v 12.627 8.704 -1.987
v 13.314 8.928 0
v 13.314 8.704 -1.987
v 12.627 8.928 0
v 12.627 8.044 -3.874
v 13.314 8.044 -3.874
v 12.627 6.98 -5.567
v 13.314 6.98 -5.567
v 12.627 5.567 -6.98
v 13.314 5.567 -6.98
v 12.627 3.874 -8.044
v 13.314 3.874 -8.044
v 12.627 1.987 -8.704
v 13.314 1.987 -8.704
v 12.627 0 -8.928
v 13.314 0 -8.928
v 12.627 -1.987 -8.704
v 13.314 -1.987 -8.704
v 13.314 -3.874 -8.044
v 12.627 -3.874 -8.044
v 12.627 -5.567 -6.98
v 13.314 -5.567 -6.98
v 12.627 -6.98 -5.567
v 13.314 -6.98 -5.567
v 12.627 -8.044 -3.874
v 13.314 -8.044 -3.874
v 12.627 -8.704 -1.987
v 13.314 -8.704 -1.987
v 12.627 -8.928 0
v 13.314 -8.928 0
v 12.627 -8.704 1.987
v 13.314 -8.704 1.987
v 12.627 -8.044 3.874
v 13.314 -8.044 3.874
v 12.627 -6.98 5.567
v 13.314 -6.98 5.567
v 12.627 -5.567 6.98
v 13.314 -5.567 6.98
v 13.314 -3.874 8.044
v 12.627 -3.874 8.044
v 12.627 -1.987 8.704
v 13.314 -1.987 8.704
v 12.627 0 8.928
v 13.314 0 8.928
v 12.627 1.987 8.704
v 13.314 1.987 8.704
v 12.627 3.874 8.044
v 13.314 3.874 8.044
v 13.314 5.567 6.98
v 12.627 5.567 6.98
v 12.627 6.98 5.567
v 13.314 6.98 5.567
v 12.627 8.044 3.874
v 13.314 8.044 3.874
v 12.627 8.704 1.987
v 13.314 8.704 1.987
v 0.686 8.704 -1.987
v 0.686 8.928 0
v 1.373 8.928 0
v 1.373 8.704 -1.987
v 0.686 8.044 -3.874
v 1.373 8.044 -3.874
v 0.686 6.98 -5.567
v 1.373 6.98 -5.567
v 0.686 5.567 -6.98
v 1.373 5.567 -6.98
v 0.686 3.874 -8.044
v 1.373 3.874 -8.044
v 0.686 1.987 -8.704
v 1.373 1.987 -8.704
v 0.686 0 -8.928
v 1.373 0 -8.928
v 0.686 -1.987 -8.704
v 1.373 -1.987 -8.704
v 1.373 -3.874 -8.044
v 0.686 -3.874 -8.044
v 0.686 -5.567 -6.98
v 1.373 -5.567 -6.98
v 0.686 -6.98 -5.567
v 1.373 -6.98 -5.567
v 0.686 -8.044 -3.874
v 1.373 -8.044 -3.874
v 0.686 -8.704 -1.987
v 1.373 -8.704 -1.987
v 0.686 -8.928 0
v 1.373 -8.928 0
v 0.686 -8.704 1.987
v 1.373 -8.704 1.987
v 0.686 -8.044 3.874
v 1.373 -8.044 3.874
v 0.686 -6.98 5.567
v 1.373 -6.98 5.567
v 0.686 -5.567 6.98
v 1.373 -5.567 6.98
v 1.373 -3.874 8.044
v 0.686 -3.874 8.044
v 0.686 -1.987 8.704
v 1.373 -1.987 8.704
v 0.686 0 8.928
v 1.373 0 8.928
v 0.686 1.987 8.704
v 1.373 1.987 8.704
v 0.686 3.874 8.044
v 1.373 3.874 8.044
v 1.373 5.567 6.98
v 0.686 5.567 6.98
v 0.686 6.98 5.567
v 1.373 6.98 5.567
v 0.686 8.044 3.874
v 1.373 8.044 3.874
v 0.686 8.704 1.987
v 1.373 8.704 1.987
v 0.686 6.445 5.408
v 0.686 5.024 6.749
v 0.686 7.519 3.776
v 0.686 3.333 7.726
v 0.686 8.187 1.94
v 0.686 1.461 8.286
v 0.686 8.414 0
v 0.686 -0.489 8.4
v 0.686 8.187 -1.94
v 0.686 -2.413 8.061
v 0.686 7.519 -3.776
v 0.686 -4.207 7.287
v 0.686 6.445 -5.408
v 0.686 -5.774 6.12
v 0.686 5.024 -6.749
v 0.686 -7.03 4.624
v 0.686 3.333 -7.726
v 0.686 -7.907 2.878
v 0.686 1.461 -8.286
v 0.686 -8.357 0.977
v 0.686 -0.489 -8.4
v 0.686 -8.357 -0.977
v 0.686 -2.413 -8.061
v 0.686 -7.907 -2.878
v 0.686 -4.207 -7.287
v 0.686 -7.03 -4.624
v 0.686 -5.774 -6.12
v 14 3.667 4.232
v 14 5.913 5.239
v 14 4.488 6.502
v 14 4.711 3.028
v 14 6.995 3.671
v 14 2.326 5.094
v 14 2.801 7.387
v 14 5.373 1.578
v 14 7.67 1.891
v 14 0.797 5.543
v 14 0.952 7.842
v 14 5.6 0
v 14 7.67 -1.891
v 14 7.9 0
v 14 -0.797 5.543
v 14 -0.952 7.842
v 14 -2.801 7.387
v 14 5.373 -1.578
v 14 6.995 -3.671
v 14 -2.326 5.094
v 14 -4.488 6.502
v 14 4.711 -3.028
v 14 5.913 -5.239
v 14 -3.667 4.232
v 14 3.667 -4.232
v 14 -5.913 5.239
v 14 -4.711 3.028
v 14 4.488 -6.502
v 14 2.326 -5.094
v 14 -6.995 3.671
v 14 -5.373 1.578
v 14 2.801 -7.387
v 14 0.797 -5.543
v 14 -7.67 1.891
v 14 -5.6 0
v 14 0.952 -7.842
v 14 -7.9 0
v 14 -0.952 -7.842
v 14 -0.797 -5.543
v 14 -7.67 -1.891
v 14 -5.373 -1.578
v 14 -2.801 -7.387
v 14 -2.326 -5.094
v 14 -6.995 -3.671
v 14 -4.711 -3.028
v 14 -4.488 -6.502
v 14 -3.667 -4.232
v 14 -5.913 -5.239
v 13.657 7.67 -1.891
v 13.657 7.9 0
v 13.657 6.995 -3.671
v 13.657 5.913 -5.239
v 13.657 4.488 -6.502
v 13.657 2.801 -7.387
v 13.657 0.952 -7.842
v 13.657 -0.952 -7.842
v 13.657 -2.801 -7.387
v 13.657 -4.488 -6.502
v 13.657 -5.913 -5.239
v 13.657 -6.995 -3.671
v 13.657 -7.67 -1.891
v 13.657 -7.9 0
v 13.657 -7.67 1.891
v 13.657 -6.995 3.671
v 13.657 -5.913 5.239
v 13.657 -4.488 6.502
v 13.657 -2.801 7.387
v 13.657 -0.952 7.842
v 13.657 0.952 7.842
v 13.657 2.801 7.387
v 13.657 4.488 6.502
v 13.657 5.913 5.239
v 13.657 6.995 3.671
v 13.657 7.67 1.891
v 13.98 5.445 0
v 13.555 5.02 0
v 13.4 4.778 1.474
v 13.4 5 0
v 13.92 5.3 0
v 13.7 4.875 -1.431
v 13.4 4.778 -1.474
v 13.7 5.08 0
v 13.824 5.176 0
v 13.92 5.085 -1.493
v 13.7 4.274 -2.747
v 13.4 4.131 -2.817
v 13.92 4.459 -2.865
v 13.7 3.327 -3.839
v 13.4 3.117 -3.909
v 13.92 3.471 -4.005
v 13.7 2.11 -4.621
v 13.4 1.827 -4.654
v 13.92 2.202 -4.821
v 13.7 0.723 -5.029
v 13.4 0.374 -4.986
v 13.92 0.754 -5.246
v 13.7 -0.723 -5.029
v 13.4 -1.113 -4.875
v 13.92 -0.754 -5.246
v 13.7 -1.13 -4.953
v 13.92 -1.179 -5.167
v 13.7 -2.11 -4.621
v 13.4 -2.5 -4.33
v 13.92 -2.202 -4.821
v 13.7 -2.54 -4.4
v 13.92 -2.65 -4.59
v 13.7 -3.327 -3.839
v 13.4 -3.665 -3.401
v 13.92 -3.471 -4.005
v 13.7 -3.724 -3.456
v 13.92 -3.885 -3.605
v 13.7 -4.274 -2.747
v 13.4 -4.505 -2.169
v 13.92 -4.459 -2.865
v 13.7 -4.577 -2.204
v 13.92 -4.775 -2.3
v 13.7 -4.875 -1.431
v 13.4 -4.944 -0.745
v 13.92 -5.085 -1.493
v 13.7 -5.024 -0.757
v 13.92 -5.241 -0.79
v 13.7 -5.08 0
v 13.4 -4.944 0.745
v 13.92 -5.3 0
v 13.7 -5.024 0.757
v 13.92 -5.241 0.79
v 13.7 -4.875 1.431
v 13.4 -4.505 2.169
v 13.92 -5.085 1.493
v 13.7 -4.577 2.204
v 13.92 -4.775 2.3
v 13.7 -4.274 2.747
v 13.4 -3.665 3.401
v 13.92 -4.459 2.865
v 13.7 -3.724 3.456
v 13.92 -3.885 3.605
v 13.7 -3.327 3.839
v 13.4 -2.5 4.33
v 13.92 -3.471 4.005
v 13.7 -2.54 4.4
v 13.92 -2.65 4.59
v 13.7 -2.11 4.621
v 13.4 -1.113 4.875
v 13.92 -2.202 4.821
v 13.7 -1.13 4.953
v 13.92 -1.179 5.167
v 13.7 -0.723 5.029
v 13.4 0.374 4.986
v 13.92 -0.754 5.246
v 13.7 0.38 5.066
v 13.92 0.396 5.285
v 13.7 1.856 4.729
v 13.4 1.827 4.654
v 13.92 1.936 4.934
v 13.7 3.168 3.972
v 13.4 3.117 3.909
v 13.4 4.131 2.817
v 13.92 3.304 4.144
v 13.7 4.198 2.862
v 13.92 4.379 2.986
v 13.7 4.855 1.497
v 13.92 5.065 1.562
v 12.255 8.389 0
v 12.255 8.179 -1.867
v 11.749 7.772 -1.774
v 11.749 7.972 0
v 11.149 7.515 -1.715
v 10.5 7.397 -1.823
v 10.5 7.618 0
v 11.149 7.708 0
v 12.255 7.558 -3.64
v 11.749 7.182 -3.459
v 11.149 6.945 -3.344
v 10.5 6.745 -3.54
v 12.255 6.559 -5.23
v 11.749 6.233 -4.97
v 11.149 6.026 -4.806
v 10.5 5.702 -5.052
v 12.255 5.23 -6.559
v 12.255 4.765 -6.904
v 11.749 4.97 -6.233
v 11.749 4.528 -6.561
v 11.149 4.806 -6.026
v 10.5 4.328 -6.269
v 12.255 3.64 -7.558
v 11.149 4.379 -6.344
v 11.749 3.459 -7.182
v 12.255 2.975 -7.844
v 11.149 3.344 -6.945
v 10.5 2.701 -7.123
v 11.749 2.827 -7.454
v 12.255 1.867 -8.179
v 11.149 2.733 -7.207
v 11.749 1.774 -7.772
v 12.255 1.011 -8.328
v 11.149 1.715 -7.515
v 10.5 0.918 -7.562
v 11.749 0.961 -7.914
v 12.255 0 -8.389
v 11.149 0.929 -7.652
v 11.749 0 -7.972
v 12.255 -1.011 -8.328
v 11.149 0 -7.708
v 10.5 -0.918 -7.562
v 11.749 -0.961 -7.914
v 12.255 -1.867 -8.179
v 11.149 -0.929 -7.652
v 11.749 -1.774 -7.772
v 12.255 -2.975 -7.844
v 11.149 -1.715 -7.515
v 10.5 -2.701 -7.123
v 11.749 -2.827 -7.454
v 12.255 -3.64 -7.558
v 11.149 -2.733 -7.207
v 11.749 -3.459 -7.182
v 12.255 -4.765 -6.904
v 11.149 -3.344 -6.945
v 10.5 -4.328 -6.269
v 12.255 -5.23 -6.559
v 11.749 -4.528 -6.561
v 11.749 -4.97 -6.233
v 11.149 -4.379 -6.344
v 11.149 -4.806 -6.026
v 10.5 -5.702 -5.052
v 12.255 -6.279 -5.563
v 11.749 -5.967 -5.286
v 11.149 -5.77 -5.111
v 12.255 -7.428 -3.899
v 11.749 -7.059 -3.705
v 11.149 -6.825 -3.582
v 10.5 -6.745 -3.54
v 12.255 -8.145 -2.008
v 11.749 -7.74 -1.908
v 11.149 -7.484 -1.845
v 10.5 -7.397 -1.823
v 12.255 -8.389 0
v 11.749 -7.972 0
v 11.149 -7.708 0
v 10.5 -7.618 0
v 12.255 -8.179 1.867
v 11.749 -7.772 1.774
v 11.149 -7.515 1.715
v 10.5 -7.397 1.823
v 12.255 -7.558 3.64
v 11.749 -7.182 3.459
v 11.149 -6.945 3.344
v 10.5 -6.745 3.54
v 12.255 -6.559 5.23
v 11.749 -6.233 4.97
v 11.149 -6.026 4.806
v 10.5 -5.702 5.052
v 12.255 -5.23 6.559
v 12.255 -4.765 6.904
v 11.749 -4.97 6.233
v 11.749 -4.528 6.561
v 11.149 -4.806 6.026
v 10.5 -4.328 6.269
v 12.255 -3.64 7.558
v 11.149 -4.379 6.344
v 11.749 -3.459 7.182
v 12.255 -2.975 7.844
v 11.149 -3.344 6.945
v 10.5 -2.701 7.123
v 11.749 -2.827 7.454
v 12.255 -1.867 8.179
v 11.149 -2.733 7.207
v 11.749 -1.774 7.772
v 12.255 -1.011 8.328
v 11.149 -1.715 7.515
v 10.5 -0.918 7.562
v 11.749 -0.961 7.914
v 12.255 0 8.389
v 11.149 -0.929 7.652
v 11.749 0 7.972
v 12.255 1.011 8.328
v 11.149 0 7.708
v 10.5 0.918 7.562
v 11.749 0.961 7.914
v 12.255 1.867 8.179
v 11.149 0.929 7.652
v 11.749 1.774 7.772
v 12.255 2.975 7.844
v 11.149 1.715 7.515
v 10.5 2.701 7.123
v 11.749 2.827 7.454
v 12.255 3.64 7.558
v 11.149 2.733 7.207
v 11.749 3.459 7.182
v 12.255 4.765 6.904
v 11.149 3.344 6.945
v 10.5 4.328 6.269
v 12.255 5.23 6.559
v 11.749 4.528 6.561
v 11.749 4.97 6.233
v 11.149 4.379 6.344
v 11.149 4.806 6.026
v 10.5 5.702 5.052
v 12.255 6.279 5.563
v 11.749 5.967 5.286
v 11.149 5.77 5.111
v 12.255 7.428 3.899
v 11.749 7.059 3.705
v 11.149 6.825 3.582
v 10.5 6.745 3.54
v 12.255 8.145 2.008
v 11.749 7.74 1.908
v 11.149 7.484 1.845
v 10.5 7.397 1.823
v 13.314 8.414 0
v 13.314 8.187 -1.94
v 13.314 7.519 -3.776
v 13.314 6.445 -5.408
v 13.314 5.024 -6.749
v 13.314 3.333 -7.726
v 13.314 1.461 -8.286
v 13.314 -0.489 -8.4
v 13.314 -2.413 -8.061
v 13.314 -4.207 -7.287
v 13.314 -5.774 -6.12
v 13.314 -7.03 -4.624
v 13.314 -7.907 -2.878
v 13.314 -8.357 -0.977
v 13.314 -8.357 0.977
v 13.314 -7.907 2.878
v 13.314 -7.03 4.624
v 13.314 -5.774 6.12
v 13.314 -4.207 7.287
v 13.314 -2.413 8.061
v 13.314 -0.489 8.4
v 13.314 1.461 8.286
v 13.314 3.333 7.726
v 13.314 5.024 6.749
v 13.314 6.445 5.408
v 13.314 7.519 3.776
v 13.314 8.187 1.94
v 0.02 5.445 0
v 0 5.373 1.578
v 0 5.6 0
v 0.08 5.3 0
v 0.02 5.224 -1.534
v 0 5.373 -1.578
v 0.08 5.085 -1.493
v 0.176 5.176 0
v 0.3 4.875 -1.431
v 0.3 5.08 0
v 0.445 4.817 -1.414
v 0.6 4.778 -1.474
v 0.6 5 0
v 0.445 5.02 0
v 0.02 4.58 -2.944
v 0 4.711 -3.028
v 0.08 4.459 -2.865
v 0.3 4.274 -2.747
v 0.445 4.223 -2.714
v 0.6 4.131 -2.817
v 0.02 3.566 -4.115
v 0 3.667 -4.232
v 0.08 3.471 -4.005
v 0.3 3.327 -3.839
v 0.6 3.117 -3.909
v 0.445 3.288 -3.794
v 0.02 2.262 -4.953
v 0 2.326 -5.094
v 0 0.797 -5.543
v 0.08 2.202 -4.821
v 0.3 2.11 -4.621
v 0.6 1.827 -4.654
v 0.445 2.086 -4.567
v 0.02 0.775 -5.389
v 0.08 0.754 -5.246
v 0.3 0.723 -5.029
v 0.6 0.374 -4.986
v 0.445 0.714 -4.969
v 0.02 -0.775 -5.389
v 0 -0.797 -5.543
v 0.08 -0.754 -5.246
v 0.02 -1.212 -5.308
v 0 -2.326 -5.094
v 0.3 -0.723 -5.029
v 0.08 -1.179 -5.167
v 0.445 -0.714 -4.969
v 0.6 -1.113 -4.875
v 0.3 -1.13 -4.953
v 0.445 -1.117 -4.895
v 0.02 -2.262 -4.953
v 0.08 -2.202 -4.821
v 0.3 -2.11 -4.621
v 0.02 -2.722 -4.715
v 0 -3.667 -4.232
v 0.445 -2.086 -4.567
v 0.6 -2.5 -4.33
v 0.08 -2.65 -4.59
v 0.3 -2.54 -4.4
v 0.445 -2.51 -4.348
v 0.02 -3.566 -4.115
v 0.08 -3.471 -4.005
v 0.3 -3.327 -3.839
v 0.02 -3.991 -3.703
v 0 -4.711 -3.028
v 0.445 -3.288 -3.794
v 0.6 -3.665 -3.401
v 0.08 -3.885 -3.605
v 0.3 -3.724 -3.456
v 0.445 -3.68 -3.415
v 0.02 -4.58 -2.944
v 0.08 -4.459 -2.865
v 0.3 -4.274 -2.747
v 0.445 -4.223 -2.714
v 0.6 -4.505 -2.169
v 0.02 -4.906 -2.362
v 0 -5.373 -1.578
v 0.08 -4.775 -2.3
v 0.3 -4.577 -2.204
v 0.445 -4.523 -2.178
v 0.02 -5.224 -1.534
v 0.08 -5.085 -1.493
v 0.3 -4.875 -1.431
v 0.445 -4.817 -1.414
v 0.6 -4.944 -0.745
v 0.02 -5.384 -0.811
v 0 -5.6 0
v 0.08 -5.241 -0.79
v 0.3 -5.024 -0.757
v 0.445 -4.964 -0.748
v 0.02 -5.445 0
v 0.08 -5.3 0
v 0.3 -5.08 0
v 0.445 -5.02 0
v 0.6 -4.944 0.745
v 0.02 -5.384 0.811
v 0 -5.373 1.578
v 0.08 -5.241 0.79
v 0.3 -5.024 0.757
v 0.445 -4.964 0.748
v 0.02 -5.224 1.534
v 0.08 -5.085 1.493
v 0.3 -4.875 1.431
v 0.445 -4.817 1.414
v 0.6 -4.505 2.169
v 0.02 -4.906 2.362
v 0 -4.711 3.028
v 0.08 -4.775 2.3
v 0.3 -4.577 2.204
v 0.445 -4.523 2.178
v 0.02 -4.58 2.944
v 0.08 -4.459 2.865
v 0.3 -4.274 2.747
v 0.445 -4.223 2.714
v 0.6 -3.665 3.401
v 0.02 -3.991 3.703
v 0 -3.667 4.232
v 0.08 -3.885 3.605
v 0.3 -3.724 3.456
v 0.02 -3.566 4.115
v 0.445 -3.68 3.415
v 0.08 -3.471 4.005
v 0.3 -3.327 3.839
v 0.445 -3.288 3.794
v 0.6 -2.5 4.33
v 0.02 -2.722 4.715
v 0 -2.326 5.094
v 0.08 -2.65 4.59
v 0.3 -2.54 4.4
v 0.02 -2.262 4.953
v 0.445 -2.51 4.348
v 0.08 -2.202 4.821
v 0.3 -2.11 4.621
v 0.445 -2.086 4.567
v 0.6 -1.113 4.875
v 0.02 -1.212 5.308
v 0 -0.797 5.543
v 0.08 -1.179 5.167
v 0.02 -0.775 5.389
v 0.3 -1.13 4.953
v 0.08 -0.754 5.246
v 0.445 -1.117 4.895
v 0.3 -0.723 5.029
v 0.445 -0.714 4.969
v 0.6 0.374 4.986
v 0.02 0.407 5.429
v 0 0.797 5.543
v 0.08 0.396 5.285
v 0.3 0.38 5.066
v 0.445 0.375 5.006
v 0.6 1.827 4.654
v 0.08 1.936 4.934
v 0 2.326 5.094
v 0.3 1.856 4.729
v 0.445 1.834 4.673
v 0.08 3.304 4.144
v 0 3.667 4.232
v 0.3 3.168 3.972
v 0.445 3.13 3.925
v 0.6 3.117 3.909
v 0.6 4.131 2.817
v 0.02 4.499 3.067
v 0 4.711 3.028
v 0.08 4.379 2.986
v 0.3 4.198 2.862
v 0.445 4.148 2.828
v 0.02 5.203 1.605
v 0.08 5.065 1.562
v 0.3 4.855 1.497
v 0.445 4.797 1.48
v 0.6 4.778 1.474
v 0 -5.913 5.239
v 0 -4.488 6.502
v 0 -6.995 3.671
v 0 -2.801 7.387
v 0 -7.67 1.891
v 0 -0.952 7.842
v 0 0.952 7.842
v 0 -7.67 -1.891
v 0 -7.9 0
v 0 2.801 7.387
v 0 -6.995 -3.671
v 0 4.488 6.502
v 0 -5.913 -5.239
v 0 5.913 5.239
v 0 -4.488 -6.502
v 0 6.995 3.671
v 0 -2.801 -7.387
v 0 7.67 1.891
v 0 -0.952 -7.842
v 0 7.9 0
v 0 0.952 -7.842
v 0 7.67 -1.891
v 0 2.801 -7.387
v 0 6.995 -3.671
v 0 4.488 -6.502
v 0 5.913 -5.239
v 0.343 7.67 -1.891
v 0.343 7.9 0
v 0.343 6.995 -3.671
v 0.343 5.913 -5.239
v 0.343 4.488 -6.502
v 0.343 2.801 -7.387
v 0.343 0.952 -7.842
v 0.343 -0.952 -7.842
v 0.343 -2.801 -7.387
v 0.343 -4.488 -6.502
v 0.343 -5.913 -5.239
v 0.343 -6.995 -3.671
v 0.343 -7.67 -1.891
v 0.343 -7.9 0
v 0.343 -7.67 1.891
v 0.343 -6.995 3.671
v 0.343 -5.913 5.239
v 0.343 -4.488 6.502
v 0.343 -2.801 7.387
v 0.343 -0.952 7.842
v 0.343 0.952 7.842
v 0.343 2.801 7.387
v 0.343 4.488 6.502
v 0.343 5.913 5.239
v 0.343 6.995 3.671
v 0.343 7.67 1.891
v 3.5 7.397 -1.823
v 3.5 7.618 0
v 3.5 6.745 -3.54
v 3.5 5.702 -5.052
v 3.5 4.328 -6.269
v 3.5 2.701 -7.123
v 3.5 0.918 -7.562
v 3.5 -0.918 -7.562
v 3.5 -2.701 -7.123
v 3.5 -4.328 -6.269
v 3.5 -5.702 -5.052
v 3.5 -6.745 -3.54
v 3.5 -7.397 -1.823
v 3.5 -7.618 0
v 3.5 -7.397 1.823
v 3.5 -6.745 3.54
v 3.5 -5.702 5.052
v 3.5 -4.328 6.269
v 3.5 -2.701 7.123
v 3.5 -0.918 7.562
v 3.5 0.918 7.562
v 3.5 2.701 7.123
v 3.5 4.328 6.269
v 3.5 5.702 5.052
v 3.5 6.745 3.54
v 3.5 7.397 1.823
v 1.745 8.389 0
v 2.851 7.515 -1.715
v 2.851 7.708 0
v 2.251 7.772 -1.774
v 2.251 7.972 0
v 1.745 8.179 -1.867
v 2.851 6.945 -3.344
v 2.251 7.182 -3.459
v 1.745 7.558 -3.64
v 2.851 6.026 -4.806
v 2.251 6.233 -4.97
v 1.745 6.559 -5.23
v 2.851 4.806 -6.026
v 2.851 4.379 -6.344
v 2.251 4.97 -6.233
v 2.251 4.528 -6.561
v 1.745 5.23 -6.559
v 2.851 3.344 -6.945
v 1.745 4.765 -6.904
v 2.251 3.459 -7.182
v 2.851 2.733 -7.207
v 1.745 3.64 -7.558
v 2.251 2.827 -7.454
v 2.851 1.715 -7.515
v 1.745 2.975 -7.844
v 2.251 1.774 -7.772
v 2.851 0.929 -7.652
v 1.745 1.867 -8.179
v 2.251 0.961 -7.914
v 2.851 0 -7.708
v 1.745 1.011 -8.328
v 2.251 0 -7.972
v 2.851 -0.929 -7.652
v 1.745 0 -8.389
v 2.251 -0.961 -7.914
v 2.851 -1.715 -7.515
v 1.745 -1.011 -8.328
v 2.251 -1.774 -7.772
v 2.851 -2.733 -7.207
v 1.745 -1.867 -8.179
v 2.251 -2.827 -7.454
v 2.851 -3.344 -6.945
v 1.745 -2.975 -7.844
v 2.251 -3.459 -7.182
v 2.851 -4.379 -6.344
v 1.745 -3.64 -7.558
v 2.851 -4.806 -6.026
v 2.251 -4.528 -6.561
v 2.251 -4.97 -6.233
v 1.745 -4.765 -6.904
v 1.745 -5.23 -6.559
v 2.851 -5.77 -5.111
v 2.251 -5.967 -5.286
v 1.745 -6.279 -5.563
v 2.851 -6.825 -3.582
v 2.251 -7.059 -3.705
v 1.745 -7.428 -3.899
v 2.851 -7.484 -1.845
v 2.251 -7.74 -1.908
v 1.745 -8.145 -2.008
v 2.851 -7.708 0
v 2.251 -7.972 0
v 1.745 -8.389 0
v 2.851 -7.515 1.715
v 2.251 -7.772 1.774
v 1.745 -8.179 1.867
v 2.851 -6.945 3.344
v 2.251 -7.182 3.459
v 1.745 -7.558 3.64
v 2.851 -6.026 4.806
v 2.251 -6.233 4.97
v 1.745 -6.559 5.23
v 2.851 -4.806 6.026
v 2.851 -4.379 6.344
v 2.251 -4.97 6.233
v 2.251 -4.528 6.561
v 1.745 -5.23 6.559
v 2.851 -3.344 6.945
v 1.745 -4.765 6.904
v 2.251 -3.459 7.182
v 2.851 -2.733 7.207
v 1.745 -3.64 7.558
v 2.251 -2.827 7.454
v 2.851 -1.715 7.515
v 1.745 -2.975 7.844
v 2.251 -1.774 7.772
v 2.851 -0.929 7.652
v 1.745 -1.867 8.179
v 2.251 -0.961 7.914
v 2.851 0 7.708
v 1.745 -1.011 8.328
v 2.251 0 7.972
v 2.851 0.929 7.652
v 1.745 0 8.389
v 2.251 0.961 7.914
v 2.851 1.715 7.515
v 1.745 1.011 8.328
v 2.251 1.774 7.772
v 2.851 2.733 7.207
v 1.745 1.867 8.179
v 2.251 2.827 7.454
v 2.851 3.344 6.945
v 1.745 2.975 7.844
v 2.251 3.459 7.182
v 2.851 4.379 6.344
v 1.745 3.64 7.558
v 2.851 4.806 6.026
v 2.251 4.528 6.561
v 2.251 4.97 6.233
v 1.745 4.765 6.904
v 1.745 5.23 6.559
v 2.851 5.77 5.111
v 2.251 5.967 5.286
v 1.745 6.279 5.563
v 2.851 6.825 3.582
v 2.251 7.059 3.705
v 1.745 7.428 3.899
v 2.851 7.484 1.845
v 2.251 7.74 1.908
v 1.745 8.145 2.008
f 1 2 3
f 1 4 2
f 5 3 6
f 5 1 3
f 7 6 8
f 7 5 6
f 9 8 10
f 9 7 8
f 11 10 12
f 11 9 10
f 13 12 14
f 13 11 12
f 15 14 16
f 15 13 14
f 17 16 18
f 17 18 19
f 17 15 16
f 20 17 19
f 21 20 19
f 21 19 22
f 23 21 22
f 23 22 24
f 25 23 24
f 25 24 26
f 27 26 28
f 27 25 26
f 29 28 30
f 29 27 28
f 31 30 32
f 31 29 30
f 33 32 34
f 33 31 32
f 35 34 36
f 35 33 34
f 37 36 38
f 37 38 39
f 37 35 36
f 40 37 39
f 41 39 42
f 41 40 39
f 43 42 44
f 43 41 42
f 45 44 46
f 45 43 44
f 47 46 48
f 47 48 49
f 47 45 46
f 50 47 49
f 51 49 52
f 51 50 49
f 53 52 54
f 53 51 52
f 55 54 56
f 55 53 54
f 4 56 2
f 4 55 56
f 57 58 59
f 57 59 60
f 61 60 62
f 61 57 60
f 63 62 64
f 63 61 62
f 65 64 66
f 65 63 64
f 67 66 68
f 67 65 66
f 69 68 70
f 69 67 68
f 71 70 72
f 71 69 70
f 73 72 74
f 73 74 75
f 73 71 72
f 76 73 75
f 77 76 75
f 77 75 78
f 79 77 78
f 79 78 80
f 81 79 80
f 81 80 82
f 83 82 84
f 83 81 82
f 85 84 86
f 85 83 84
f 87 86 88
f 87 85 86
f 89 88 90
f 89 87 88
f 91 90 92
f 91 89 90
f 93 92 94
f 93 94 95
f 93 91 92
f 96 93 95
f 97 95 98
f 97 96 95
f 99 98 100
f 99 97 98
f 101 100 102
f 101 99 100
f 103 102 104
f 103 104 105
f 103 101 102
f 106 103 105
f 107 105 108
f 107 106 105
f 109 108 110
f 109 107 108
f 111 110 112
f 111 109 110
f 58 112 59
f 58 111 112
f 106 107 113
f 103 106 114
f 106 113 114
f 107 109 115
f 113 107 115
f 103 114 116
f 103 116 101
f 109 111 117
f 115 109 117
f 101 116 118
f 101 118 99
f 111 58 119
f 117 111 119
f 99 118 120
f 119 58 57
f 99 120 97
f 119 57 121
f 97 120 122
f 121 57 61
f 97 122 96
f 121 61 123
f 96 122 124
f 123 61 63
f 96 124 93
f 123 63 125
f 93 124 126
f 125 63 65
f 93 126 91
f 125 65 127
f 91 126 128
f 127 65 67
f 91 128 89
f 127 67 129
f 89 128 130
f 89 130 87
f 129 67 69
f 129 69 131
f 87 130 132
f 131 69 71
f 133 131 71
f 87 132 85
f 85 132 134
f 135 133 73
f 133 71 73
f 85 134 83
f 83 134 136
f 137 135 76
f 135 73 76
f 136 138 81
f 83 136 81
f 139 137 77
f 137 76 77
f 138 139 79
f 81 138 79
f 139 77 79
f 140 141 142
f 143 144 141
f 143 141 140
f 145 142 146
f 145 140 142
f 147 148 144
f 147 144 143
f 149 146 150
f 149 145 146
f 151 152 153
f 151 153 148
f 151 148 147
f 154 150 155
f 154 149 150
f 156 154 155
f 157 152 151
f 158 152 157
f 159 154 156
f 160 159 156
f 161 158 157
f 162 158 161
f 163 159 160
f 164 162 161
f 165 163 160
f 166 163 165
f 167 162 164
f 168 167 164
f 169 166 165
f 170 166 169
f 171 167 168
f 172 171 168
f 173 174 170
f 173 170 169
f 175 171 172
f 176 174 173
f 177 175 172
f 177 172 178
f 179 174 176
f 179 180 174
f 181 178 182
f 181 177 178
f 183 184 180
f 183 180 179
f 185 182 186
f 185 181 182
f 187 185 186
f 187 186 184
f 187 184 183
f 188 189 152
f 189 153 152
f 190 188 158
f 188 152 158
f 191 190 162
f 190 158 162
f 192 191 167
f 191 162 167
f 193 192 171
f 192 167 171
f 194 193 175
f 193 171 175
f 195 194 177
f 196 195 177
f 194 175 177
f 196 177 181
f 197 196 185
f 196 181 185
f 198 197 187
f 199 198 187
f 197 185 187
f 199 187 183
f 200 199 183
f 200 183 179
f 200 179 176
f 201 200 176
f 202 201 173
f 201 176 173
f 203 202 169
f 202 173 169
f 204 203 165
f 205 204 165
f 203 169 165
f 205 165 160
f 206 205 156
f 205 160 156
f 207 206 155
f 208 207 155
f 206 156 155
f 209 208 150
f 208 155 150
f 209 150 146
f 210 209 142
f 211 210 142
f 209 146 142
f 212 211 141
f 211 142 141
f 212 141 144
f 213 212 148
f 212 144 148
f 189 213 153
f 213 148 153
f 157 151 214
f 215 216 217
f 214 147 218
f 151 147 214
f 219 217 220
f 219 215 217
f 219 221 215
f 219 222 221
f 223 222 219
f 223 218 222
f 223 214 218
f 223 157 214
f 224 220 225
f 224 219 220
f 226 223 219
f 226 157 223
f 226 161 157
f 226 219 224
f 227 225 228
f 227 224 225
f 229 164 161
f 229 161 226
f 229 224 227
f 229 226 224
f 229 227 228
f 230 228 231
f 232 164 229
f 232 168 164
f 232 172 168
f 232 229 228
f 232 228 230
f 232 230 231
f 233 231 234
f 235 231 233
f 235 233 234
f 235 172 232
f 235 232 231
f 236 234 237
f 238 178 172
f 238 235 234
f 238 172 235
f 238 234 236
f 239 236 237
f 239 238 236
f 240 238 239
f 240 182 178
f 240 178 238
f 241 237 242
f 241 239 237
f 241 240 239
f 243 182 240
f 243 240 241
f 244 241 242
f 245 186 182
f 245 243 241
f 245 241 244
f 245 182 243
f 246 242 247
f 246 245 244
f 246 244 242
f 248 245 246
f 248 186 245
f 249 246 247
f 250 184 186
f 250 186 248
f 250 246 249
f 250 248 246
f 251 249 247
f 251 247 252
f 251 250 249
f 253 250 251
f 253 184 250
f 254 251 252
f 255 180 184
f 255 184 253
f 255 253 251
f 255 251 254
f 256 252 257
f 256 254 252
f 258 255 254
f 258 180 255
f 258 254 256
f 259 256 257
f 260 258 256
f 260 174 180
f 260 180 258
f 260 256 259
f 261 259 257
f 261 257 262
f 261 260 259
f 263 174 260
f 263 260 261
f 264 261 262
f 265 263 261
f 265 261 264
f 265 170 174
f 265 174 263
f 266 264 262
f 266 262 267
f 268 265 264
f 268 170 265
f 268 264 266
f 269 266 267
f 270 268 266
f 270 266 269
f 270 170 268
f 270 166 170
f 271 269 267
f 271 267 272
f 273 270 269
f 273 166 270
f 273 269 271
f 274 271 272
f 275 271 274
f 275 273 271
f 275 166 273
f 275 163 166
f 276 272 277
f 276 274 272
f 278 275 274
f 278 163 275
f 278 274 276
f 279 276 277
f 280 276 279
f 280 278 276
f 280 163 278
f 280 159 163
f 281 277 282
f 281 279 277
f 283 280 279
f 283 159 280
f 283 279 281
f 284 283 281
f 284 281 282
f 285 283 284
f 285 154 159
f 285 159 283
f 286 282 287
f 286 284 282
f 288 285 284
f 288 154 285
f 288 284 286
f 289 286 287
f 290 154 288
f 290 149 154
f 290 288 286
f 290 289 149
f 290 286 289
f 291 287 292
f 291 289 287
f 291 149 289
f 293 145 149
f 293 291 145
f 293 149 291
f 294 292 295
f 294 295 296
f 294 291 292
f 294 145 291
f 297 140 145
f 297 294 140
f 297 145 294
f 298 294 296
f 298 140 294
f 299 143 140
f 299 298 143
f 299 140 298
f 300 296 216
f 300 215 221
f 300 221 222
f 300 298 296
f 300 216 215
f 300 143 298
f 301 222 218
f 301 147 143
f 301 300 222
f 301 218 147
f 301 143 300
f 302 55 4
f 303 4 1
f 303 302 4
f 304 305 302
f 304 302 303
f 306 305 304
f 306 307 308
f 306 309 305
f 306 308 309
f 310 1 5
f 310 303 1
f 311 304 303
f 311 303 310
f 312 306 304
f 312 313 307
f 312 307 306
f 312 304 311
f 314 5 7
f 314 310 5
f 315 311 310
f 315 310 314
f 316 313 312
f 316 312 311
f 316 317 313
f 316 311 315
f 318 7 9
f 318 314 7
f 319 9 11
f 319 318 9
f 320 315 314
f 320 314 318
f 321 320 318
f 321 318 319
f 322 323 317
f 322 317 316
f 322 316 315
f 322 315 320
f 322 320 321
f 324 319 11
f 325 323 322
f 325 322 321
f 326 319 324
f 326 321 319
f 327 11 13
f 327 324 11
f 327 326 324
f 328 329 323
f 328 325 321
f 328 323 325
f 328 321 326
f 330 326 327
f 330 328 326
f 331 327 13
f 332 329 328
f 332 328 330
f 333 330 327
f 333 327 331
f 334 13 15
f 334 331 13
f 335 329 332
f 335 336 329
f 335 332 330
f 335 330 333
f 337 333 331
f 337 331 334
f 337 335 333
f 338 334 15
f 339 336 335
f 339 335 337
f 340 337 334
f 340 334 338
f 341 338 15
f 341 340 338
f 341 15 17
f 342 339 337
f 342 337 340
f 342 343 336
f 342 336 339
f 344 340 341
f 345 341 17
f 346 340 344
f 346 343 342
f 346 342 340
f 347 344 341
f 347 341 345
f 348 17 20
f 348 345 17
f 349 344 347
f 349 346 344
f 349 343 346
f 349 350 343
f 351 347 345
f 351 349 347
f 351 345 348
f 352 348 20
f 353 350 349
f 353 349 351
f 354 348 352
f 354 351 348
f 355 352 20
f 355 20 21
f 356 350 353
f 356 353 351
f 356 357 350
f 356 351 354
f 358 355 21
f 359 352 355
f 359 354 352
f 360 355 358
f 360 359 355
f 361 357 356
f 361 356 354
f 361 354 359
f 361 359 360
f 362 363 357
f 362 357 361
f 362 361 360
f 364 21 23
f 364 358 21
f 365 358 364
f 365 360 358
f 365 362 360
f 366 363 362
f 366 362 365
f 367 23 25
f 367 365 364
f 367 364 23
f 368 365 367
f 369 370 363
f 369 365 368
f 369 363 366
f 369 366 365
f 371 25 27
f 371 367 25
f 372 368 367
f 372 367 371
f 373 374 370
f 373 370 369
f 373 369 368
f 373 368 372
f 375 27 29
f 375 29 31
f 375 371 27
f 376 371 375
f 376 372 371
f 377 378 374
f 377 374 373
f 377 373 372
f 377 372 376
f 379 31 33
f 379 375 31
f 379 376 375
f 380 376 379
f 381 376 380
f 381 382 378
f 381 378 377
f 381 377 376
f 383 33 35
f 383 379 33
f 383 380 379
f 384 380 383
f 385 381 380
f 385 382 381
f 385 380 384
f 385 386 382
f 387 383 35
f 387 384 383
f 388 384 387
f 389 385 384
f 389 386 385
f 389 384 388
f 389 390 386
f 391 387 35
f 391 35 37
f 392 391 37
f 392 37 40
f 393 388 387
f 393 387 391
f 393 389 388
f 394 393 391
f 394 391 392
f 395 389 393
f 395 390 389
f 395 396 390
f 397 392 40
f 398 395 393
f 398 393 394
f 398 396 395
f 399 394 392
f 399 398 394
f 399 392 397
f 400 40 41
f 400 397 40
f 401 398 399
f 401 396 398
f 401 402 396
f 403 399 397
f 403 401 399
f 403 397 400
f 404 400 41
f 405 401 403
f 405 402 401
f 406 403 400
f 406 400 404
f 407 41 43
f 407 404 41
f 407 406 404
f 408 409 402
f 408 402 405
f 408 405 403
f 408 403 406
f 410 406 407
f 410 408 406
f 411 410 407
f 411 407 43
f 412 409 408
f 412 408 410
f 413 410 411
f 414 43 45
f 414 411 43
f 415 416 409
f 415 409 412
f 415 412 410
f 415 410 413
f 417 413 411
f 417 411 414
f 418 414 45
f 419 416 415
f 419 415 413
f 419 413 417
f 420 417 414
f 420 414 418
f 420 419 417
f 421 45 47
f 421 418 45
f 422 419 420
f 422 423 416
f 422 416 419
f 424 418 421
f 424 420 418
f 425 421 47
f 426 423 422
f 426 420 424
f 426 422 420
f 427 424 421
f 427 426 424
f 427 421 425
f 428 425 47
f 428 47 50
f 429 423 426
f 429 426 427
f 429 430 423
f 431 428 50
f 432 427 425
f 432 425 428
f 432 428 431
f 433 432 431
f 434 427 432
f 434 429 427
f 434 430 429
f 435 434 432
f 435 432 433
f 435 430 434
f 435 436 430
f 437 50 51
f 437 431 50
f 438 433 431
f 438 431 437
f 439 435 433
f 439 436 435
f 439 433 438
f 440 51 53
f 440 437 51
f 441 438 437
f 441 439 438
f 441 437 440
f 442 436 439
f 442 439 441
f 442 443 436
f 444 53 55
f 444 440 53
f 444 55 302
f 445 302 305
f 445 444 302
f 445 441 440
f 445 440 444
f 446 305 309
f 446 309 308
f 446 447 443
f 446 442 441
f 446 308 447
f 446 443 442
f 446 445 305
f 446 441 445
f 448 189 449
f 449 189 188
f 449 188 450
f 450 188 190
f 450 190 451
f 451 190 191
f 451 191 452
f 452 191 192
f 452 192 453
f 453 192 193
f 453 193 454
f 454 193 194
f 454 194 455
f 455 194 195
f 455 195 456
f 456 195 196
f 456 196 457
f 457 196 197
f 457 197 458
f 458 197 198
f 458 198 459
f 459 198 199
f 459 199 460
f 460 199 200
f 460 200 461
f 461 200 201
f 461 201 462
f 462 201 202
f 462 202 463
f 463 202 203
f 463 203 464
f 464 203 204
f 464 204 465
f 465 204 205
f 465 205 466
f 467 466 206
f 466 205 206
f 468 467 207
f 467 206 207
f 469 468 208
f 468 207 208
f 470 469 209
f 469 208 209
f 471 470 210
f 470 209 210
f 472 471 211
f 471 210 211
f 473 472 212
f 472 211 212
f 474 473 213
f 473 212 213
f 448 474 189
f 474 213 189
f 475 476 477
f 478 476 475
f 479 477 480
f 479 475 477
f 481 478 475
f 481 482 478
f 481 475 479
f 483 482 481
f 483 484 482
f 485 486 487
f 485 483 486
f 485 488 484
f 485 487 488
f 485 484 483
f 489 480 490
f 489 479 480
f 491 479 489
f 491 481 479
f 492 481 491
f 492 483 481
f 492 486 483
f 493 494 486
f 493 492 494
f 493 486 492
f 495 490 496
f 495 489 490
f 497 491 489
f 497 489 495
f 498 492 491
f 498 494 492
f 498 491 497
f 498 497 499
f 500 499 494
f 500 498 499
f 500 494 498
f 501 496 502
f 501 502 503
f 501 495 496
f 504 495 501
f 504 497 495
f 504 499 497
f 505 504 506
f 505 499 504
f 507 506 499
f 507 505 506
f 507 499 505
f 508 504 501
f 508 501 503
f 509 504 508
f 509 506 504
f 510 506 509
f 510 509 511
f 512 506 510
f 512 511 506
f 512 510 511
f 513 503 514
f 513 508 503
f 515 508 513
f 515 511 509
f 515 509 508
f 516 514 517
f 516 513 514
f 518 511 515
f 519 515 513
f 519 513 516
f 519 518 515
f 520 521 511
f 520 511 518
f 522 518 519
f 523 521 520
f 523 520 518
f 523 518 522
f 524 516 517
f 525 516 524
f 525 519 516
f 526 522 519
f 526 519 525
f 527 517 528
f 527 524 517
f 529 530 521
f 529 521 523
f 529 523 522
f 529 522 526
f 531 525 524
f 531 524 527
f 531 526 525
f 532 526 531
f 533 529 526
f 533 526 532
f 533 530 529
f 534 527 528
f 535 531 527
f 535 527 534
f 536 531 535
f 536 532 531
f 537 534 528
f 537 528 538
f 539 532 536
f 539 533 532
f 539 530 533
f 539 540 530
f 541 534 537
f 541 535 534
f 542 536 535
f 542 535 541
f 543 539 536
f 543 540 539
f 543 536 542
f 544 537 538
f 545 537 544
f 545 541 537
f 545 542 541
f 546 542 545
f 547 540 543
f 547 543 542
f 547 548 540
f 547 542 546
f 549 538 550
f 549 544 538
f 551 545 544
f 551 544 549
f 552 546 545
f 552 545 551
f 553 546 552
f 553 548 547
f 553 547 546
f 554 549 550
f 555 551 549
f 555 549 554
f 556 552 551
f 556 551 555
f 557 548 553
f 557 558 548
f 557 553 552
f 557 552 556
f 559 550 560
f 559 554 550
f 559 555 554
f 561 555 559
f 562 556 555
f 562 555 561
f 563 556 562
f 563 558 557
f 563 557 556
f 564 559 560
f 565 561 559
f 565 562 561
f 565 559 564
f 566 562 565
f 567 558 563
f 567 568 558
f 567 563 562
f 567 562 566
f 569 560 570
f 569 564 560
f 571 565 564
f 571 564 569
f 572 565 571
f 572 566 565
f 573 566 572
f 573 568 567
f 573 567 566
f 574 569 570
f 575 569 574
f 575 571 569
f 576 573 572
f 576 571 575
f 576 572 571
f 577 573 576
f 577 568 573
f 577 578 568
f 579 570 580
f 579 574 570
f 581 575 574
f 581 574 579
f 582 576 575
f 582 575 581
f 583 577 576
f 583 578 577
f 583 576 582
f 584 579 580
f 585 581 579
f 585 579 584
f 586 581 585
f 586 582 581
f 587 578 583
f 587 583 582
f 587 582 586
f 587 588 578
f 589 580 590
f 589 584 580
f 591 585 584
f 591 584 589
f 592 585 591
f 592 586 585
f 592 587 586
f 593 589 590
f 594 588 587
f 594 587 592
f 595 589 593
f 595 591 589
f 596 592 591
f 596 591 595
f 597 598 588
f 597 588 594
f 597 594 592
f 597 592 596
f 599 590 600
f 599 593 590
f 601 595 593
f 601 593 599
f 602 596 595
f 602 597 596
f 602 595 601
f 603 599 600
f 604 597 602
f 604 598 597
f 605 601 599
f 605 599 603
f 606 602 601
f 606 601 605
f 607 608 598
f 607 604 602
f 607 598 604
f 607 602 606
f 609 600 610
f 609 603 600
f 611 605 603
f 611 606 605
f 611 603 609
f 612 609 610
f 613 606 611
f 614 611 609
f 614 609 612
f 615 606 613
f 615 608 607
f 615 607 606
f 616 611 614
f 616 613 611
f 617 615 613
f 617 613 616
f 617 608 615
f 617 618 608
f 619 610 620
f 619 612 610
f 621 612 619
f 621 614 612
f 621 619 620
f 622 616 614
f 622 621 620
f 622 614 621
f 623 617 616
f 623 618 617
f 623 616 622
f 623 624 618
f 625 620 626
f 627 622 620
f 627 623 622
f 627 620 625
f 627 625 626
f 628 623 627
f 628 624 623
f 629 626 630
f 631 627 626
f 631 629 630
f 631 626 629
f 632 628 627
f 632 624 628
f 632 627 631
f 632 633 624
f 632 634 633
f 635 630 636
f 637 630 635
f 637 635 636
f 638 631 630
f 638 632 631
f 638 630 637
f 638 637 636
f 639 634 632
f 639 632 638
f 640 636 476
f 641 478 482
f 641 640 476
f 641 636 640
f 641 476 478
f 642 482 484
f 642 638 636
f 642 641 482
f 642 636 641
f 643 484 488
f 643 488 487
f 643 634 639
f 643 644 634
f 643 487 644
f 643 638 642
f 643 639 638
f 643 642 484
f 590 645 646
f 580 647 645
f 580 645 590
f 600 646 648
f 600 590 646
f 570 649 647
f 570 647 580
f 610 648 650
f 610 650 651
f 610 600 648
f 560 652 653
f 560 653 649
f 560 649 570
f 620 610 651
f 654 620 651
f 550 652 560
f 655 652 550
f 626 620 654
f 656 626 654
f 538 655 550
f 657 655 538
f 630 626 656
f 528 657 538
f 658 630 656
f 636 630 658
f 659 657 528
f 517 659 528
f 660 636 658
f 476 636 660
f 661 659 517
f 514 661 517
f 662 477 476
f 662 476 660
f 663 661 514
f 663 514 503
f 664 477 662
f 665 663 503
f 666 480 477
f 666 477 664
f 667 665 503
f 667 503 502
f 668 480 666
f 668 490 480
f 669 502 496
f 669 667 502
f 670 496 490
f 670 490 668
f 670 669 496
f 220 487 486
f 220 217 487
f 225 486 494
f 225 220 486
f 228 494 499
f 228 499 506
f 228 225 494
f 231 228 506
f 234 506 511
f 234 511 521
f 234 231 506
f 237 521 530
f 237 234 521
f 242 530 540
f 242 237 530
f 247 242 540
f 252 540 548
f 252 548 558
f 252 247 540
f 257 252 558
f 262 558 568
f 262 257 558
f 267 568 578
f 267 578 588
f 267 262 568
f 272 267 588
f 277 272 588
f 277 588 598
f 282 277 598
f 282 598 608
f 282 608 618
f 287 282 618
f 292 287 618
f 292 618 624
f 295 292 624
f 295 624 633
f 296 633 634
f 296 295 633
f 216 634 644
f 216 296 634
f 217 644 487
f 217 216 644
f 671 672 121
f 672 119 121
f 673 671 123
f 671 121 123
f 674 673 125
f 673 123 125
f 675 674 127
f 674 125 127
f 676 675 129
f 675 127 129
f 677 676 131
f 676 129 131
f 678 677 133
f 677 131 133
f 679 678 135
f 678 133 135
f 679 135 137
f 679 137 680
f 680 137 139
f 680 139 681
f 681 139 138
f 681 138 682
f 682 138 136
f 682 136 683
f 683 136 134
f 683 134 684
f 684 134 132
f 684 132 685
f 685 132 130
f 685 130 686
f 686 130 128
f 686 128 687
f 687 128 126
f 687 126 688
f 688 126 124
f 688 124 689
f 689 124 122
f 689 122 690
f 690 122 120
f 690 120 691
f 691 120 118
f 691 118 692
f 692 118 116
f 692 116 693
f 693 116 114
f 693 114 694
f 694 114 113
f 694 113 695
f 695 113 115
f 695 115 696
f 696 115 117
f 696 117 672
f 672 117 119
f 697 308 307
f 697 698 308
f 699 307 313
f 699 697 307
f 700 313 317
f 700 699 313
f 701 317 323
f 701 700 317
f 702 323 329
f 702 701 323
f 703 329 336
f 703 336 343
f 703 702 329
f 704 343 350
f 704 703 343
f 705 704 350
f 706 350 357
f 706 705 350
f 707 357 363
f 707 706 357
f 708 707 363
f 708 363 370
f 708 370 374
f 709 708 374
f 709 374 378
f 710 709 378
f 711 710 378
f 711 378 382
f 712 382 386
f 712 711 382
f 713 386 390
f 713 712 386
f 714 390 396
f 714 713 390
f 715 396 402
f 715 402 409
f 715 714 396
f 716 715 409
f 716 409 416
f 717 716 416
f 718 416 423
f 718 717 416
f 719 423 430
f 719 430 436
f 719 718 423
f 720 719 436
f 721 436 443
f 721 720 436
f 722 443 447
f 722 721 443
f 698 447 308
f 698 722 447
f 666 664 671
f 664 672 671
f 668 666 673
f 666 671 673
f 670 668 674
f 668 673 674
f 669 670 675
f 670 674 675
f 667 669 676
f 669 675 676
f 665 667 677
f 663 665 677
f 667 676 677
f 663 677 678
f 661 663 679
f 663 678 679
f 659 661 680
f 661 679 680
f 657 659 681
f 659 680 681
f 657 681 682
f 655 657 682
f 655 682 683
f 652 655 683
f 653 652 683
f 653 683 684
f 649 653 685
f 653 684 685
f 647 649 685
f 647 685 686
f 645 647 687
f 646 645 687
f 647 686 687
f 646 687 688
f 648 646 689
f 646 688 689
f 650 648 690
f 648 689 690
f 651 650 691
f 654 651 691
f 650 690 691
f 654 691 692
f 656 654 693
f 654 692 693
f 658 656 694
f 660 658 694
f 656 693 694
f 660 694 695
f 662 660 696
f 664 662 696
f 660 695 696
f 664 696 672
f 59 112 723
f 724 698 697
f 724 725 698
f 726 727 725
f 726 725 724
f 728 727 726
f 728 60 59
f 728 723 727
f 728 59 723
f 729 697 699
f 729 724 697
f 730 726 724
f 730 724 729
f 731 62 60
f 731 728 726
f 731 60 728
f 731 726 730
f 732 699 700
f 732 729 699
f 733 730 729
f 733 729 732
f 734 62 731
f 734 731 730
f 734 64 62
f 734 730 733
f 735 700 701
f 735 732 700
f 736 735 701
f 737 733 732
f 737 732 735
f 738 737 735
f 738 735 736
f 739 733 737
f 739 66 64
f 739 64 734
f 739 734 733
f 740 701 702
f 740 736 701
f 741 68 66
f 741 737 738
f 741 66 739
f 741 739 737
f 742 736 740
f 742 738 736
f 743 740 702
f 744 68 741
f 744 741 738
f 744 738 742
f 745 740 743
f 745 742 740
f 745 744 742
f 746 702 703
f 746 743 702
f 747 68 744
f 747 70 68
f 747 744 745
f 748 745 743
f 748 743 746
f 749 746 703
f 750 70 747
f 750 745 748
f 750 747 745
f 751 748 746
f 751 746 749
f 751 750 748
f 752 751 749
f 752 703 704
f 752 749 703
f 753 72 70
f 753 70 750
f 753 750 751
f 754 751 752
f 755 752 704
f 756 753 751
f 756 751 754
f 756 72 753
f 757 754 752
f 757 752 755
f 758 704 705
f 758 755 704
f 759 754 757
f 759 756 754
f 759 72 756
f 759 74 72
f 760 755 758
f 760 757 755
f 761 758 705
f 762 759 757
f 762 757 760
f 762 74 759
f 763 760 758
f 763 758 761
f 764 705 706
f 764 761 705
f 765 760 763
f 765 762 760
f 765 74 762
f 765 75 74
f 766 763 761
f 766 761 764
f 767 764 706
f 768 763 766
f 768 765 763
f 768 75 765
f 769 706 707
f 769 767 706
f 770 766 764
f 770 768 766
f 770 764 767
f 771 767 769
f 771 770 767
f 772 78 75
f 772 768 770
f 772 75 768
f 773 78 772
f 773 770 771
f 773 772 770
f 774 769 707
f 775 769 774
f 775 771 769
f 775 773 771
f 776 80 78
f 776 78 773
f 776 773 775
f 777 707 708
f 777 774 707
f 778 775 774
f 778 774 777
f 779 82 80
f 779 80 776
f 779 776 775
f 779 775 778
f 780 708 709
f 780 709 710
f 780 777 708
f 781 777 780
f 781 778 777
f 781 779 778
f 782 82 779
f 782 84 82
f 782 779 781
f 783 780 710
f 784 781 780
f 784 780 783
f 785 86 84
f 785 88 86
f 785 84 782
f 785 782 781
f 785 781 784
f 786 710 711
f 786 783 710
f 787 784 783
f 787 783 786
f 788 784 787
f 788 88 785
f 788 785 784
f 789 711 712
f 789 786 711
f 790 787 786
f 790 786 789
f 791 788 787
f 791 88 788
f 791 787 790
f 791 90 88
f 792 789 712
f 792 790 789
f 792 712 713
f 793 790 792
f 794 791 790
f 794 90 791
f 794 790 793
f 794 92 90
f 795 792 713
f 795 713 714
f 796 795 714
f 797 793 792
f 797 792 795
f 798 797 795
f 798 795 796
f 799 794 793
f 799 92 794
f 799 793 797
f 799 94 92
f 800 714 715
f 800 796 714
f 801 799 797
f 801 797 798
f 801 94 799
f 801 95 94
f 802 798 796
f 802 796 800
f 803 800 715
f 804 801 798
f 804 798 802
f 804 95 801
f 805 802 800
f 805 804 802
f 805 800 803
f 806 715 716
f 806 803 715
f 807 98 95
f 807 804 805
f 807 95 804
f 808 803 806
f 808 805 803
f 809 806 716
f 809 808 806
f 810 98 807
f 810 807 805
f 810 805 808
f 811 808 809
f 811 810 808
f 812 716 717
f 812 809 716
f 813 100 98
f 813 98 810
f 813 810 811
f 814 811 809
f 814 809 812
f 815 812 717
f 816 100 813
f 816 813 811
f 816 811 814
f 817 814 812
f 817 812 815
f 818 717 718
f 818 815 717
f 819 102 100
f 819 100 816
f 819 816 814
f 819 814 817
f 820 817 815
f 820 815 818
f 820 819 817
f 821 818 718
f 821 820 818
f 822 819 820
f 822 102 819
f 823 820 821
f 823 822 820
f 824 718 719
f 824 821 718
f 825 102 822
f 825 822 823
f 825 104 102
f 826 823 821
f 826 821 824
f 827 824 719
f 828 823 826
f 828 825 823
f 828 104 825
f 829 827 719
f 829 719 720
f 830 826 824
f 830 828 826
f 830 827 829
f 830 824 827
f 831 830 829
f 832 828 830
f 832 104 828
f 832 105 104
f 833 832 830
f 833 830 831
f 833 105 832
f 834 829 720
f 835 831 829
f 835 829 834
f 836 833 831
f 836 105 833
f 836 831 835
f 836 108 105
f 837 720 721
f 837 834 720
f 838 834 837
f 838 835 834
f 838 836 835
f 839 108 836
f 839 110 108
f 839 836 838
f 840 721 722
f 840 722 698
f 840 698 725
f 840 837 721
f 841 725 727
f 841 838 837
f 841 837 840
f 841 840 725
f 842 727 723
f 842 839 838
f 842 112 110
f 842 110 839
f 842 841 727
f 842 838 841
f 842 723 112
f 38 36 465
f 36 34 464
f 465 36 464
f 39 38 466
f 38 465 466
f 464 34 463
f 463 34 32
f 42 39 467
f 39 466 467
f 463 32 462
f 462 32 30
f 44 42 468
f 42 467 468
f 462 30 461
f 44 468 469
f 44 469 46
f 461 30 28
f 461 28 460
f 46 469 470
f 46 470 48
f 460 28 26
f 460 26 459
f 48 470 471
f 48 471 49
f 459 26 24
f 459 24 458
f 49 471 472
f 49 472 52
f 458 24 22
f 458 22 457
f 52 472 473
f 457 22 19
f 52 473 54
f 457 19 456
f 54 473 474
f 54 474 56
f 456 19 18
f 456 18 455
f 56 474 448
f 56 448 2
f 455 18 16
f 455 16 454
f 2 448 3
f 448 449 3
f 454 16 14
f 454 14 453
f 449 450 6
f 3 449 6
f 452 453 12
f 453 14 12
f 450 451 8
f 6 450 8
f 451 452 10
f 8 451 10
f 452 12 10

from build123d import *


with BuildPart() as part:
    # Sketch1 → Revolve1 (revolve)
    with BuildSketch(Plane.XY):
        with BuildLine():
            Line((0.6, 5), (13.4, 5))
            ThreePointArc((13.4, 5), (13.824264069, 5.175735931), (14, 5.6))
            Line((14, 5.6), (14, 8.728))
            ThreePointArc((14, 8.728), (13.941421356, 8.869421356), (13.8, 8.928))
            Line((13.8, 8.928), (12.627143625, 8.928))
            ThreePointArc((12.627143625, 8.928), (11.749083664, 7.971770723), (10.5, 7.618))
            Line((10.5, 7.618), (3.5, 7.618))
            ThreePointArc((3.5, 7.618), (2.250916336, 7.971770723), (1.372856375, 8.928))
            Line((1.372856375, 8.928), (0.2, 8.928))
            ThreePointArc((0.2, 8.928), (0.058578644, 8.869421356), (0, 8.728))
            Line((0, 8.728), (0, 5.6))
            ThreePointArc((0, 5.6), (0.175735931, 5.175735931), (0.6, 5))
        make_face()
    revolve(axis=Axis((13.4, 0, 0), (-1, 0, 0)))

    # Sketch2 → Cut-Revolve1 (revolve, cut)
    with BuildSketch(Plane.XY):
        Polygon((0, 7.9), (0.343214094, 7.9), (0.686428188, 8.414), (0.686428188, 8.928), (13.313571812, 8.928), (13.313571812, 8.414), (13.656785906, 7.9), (14, 7.9), (14, 11.828), (0, 11.828), align=None)
    revolve(axis=Axis((14, 0, 0), (-1, 0, 0)), mode=Mode.SUBTRACT)


solid = part.part
